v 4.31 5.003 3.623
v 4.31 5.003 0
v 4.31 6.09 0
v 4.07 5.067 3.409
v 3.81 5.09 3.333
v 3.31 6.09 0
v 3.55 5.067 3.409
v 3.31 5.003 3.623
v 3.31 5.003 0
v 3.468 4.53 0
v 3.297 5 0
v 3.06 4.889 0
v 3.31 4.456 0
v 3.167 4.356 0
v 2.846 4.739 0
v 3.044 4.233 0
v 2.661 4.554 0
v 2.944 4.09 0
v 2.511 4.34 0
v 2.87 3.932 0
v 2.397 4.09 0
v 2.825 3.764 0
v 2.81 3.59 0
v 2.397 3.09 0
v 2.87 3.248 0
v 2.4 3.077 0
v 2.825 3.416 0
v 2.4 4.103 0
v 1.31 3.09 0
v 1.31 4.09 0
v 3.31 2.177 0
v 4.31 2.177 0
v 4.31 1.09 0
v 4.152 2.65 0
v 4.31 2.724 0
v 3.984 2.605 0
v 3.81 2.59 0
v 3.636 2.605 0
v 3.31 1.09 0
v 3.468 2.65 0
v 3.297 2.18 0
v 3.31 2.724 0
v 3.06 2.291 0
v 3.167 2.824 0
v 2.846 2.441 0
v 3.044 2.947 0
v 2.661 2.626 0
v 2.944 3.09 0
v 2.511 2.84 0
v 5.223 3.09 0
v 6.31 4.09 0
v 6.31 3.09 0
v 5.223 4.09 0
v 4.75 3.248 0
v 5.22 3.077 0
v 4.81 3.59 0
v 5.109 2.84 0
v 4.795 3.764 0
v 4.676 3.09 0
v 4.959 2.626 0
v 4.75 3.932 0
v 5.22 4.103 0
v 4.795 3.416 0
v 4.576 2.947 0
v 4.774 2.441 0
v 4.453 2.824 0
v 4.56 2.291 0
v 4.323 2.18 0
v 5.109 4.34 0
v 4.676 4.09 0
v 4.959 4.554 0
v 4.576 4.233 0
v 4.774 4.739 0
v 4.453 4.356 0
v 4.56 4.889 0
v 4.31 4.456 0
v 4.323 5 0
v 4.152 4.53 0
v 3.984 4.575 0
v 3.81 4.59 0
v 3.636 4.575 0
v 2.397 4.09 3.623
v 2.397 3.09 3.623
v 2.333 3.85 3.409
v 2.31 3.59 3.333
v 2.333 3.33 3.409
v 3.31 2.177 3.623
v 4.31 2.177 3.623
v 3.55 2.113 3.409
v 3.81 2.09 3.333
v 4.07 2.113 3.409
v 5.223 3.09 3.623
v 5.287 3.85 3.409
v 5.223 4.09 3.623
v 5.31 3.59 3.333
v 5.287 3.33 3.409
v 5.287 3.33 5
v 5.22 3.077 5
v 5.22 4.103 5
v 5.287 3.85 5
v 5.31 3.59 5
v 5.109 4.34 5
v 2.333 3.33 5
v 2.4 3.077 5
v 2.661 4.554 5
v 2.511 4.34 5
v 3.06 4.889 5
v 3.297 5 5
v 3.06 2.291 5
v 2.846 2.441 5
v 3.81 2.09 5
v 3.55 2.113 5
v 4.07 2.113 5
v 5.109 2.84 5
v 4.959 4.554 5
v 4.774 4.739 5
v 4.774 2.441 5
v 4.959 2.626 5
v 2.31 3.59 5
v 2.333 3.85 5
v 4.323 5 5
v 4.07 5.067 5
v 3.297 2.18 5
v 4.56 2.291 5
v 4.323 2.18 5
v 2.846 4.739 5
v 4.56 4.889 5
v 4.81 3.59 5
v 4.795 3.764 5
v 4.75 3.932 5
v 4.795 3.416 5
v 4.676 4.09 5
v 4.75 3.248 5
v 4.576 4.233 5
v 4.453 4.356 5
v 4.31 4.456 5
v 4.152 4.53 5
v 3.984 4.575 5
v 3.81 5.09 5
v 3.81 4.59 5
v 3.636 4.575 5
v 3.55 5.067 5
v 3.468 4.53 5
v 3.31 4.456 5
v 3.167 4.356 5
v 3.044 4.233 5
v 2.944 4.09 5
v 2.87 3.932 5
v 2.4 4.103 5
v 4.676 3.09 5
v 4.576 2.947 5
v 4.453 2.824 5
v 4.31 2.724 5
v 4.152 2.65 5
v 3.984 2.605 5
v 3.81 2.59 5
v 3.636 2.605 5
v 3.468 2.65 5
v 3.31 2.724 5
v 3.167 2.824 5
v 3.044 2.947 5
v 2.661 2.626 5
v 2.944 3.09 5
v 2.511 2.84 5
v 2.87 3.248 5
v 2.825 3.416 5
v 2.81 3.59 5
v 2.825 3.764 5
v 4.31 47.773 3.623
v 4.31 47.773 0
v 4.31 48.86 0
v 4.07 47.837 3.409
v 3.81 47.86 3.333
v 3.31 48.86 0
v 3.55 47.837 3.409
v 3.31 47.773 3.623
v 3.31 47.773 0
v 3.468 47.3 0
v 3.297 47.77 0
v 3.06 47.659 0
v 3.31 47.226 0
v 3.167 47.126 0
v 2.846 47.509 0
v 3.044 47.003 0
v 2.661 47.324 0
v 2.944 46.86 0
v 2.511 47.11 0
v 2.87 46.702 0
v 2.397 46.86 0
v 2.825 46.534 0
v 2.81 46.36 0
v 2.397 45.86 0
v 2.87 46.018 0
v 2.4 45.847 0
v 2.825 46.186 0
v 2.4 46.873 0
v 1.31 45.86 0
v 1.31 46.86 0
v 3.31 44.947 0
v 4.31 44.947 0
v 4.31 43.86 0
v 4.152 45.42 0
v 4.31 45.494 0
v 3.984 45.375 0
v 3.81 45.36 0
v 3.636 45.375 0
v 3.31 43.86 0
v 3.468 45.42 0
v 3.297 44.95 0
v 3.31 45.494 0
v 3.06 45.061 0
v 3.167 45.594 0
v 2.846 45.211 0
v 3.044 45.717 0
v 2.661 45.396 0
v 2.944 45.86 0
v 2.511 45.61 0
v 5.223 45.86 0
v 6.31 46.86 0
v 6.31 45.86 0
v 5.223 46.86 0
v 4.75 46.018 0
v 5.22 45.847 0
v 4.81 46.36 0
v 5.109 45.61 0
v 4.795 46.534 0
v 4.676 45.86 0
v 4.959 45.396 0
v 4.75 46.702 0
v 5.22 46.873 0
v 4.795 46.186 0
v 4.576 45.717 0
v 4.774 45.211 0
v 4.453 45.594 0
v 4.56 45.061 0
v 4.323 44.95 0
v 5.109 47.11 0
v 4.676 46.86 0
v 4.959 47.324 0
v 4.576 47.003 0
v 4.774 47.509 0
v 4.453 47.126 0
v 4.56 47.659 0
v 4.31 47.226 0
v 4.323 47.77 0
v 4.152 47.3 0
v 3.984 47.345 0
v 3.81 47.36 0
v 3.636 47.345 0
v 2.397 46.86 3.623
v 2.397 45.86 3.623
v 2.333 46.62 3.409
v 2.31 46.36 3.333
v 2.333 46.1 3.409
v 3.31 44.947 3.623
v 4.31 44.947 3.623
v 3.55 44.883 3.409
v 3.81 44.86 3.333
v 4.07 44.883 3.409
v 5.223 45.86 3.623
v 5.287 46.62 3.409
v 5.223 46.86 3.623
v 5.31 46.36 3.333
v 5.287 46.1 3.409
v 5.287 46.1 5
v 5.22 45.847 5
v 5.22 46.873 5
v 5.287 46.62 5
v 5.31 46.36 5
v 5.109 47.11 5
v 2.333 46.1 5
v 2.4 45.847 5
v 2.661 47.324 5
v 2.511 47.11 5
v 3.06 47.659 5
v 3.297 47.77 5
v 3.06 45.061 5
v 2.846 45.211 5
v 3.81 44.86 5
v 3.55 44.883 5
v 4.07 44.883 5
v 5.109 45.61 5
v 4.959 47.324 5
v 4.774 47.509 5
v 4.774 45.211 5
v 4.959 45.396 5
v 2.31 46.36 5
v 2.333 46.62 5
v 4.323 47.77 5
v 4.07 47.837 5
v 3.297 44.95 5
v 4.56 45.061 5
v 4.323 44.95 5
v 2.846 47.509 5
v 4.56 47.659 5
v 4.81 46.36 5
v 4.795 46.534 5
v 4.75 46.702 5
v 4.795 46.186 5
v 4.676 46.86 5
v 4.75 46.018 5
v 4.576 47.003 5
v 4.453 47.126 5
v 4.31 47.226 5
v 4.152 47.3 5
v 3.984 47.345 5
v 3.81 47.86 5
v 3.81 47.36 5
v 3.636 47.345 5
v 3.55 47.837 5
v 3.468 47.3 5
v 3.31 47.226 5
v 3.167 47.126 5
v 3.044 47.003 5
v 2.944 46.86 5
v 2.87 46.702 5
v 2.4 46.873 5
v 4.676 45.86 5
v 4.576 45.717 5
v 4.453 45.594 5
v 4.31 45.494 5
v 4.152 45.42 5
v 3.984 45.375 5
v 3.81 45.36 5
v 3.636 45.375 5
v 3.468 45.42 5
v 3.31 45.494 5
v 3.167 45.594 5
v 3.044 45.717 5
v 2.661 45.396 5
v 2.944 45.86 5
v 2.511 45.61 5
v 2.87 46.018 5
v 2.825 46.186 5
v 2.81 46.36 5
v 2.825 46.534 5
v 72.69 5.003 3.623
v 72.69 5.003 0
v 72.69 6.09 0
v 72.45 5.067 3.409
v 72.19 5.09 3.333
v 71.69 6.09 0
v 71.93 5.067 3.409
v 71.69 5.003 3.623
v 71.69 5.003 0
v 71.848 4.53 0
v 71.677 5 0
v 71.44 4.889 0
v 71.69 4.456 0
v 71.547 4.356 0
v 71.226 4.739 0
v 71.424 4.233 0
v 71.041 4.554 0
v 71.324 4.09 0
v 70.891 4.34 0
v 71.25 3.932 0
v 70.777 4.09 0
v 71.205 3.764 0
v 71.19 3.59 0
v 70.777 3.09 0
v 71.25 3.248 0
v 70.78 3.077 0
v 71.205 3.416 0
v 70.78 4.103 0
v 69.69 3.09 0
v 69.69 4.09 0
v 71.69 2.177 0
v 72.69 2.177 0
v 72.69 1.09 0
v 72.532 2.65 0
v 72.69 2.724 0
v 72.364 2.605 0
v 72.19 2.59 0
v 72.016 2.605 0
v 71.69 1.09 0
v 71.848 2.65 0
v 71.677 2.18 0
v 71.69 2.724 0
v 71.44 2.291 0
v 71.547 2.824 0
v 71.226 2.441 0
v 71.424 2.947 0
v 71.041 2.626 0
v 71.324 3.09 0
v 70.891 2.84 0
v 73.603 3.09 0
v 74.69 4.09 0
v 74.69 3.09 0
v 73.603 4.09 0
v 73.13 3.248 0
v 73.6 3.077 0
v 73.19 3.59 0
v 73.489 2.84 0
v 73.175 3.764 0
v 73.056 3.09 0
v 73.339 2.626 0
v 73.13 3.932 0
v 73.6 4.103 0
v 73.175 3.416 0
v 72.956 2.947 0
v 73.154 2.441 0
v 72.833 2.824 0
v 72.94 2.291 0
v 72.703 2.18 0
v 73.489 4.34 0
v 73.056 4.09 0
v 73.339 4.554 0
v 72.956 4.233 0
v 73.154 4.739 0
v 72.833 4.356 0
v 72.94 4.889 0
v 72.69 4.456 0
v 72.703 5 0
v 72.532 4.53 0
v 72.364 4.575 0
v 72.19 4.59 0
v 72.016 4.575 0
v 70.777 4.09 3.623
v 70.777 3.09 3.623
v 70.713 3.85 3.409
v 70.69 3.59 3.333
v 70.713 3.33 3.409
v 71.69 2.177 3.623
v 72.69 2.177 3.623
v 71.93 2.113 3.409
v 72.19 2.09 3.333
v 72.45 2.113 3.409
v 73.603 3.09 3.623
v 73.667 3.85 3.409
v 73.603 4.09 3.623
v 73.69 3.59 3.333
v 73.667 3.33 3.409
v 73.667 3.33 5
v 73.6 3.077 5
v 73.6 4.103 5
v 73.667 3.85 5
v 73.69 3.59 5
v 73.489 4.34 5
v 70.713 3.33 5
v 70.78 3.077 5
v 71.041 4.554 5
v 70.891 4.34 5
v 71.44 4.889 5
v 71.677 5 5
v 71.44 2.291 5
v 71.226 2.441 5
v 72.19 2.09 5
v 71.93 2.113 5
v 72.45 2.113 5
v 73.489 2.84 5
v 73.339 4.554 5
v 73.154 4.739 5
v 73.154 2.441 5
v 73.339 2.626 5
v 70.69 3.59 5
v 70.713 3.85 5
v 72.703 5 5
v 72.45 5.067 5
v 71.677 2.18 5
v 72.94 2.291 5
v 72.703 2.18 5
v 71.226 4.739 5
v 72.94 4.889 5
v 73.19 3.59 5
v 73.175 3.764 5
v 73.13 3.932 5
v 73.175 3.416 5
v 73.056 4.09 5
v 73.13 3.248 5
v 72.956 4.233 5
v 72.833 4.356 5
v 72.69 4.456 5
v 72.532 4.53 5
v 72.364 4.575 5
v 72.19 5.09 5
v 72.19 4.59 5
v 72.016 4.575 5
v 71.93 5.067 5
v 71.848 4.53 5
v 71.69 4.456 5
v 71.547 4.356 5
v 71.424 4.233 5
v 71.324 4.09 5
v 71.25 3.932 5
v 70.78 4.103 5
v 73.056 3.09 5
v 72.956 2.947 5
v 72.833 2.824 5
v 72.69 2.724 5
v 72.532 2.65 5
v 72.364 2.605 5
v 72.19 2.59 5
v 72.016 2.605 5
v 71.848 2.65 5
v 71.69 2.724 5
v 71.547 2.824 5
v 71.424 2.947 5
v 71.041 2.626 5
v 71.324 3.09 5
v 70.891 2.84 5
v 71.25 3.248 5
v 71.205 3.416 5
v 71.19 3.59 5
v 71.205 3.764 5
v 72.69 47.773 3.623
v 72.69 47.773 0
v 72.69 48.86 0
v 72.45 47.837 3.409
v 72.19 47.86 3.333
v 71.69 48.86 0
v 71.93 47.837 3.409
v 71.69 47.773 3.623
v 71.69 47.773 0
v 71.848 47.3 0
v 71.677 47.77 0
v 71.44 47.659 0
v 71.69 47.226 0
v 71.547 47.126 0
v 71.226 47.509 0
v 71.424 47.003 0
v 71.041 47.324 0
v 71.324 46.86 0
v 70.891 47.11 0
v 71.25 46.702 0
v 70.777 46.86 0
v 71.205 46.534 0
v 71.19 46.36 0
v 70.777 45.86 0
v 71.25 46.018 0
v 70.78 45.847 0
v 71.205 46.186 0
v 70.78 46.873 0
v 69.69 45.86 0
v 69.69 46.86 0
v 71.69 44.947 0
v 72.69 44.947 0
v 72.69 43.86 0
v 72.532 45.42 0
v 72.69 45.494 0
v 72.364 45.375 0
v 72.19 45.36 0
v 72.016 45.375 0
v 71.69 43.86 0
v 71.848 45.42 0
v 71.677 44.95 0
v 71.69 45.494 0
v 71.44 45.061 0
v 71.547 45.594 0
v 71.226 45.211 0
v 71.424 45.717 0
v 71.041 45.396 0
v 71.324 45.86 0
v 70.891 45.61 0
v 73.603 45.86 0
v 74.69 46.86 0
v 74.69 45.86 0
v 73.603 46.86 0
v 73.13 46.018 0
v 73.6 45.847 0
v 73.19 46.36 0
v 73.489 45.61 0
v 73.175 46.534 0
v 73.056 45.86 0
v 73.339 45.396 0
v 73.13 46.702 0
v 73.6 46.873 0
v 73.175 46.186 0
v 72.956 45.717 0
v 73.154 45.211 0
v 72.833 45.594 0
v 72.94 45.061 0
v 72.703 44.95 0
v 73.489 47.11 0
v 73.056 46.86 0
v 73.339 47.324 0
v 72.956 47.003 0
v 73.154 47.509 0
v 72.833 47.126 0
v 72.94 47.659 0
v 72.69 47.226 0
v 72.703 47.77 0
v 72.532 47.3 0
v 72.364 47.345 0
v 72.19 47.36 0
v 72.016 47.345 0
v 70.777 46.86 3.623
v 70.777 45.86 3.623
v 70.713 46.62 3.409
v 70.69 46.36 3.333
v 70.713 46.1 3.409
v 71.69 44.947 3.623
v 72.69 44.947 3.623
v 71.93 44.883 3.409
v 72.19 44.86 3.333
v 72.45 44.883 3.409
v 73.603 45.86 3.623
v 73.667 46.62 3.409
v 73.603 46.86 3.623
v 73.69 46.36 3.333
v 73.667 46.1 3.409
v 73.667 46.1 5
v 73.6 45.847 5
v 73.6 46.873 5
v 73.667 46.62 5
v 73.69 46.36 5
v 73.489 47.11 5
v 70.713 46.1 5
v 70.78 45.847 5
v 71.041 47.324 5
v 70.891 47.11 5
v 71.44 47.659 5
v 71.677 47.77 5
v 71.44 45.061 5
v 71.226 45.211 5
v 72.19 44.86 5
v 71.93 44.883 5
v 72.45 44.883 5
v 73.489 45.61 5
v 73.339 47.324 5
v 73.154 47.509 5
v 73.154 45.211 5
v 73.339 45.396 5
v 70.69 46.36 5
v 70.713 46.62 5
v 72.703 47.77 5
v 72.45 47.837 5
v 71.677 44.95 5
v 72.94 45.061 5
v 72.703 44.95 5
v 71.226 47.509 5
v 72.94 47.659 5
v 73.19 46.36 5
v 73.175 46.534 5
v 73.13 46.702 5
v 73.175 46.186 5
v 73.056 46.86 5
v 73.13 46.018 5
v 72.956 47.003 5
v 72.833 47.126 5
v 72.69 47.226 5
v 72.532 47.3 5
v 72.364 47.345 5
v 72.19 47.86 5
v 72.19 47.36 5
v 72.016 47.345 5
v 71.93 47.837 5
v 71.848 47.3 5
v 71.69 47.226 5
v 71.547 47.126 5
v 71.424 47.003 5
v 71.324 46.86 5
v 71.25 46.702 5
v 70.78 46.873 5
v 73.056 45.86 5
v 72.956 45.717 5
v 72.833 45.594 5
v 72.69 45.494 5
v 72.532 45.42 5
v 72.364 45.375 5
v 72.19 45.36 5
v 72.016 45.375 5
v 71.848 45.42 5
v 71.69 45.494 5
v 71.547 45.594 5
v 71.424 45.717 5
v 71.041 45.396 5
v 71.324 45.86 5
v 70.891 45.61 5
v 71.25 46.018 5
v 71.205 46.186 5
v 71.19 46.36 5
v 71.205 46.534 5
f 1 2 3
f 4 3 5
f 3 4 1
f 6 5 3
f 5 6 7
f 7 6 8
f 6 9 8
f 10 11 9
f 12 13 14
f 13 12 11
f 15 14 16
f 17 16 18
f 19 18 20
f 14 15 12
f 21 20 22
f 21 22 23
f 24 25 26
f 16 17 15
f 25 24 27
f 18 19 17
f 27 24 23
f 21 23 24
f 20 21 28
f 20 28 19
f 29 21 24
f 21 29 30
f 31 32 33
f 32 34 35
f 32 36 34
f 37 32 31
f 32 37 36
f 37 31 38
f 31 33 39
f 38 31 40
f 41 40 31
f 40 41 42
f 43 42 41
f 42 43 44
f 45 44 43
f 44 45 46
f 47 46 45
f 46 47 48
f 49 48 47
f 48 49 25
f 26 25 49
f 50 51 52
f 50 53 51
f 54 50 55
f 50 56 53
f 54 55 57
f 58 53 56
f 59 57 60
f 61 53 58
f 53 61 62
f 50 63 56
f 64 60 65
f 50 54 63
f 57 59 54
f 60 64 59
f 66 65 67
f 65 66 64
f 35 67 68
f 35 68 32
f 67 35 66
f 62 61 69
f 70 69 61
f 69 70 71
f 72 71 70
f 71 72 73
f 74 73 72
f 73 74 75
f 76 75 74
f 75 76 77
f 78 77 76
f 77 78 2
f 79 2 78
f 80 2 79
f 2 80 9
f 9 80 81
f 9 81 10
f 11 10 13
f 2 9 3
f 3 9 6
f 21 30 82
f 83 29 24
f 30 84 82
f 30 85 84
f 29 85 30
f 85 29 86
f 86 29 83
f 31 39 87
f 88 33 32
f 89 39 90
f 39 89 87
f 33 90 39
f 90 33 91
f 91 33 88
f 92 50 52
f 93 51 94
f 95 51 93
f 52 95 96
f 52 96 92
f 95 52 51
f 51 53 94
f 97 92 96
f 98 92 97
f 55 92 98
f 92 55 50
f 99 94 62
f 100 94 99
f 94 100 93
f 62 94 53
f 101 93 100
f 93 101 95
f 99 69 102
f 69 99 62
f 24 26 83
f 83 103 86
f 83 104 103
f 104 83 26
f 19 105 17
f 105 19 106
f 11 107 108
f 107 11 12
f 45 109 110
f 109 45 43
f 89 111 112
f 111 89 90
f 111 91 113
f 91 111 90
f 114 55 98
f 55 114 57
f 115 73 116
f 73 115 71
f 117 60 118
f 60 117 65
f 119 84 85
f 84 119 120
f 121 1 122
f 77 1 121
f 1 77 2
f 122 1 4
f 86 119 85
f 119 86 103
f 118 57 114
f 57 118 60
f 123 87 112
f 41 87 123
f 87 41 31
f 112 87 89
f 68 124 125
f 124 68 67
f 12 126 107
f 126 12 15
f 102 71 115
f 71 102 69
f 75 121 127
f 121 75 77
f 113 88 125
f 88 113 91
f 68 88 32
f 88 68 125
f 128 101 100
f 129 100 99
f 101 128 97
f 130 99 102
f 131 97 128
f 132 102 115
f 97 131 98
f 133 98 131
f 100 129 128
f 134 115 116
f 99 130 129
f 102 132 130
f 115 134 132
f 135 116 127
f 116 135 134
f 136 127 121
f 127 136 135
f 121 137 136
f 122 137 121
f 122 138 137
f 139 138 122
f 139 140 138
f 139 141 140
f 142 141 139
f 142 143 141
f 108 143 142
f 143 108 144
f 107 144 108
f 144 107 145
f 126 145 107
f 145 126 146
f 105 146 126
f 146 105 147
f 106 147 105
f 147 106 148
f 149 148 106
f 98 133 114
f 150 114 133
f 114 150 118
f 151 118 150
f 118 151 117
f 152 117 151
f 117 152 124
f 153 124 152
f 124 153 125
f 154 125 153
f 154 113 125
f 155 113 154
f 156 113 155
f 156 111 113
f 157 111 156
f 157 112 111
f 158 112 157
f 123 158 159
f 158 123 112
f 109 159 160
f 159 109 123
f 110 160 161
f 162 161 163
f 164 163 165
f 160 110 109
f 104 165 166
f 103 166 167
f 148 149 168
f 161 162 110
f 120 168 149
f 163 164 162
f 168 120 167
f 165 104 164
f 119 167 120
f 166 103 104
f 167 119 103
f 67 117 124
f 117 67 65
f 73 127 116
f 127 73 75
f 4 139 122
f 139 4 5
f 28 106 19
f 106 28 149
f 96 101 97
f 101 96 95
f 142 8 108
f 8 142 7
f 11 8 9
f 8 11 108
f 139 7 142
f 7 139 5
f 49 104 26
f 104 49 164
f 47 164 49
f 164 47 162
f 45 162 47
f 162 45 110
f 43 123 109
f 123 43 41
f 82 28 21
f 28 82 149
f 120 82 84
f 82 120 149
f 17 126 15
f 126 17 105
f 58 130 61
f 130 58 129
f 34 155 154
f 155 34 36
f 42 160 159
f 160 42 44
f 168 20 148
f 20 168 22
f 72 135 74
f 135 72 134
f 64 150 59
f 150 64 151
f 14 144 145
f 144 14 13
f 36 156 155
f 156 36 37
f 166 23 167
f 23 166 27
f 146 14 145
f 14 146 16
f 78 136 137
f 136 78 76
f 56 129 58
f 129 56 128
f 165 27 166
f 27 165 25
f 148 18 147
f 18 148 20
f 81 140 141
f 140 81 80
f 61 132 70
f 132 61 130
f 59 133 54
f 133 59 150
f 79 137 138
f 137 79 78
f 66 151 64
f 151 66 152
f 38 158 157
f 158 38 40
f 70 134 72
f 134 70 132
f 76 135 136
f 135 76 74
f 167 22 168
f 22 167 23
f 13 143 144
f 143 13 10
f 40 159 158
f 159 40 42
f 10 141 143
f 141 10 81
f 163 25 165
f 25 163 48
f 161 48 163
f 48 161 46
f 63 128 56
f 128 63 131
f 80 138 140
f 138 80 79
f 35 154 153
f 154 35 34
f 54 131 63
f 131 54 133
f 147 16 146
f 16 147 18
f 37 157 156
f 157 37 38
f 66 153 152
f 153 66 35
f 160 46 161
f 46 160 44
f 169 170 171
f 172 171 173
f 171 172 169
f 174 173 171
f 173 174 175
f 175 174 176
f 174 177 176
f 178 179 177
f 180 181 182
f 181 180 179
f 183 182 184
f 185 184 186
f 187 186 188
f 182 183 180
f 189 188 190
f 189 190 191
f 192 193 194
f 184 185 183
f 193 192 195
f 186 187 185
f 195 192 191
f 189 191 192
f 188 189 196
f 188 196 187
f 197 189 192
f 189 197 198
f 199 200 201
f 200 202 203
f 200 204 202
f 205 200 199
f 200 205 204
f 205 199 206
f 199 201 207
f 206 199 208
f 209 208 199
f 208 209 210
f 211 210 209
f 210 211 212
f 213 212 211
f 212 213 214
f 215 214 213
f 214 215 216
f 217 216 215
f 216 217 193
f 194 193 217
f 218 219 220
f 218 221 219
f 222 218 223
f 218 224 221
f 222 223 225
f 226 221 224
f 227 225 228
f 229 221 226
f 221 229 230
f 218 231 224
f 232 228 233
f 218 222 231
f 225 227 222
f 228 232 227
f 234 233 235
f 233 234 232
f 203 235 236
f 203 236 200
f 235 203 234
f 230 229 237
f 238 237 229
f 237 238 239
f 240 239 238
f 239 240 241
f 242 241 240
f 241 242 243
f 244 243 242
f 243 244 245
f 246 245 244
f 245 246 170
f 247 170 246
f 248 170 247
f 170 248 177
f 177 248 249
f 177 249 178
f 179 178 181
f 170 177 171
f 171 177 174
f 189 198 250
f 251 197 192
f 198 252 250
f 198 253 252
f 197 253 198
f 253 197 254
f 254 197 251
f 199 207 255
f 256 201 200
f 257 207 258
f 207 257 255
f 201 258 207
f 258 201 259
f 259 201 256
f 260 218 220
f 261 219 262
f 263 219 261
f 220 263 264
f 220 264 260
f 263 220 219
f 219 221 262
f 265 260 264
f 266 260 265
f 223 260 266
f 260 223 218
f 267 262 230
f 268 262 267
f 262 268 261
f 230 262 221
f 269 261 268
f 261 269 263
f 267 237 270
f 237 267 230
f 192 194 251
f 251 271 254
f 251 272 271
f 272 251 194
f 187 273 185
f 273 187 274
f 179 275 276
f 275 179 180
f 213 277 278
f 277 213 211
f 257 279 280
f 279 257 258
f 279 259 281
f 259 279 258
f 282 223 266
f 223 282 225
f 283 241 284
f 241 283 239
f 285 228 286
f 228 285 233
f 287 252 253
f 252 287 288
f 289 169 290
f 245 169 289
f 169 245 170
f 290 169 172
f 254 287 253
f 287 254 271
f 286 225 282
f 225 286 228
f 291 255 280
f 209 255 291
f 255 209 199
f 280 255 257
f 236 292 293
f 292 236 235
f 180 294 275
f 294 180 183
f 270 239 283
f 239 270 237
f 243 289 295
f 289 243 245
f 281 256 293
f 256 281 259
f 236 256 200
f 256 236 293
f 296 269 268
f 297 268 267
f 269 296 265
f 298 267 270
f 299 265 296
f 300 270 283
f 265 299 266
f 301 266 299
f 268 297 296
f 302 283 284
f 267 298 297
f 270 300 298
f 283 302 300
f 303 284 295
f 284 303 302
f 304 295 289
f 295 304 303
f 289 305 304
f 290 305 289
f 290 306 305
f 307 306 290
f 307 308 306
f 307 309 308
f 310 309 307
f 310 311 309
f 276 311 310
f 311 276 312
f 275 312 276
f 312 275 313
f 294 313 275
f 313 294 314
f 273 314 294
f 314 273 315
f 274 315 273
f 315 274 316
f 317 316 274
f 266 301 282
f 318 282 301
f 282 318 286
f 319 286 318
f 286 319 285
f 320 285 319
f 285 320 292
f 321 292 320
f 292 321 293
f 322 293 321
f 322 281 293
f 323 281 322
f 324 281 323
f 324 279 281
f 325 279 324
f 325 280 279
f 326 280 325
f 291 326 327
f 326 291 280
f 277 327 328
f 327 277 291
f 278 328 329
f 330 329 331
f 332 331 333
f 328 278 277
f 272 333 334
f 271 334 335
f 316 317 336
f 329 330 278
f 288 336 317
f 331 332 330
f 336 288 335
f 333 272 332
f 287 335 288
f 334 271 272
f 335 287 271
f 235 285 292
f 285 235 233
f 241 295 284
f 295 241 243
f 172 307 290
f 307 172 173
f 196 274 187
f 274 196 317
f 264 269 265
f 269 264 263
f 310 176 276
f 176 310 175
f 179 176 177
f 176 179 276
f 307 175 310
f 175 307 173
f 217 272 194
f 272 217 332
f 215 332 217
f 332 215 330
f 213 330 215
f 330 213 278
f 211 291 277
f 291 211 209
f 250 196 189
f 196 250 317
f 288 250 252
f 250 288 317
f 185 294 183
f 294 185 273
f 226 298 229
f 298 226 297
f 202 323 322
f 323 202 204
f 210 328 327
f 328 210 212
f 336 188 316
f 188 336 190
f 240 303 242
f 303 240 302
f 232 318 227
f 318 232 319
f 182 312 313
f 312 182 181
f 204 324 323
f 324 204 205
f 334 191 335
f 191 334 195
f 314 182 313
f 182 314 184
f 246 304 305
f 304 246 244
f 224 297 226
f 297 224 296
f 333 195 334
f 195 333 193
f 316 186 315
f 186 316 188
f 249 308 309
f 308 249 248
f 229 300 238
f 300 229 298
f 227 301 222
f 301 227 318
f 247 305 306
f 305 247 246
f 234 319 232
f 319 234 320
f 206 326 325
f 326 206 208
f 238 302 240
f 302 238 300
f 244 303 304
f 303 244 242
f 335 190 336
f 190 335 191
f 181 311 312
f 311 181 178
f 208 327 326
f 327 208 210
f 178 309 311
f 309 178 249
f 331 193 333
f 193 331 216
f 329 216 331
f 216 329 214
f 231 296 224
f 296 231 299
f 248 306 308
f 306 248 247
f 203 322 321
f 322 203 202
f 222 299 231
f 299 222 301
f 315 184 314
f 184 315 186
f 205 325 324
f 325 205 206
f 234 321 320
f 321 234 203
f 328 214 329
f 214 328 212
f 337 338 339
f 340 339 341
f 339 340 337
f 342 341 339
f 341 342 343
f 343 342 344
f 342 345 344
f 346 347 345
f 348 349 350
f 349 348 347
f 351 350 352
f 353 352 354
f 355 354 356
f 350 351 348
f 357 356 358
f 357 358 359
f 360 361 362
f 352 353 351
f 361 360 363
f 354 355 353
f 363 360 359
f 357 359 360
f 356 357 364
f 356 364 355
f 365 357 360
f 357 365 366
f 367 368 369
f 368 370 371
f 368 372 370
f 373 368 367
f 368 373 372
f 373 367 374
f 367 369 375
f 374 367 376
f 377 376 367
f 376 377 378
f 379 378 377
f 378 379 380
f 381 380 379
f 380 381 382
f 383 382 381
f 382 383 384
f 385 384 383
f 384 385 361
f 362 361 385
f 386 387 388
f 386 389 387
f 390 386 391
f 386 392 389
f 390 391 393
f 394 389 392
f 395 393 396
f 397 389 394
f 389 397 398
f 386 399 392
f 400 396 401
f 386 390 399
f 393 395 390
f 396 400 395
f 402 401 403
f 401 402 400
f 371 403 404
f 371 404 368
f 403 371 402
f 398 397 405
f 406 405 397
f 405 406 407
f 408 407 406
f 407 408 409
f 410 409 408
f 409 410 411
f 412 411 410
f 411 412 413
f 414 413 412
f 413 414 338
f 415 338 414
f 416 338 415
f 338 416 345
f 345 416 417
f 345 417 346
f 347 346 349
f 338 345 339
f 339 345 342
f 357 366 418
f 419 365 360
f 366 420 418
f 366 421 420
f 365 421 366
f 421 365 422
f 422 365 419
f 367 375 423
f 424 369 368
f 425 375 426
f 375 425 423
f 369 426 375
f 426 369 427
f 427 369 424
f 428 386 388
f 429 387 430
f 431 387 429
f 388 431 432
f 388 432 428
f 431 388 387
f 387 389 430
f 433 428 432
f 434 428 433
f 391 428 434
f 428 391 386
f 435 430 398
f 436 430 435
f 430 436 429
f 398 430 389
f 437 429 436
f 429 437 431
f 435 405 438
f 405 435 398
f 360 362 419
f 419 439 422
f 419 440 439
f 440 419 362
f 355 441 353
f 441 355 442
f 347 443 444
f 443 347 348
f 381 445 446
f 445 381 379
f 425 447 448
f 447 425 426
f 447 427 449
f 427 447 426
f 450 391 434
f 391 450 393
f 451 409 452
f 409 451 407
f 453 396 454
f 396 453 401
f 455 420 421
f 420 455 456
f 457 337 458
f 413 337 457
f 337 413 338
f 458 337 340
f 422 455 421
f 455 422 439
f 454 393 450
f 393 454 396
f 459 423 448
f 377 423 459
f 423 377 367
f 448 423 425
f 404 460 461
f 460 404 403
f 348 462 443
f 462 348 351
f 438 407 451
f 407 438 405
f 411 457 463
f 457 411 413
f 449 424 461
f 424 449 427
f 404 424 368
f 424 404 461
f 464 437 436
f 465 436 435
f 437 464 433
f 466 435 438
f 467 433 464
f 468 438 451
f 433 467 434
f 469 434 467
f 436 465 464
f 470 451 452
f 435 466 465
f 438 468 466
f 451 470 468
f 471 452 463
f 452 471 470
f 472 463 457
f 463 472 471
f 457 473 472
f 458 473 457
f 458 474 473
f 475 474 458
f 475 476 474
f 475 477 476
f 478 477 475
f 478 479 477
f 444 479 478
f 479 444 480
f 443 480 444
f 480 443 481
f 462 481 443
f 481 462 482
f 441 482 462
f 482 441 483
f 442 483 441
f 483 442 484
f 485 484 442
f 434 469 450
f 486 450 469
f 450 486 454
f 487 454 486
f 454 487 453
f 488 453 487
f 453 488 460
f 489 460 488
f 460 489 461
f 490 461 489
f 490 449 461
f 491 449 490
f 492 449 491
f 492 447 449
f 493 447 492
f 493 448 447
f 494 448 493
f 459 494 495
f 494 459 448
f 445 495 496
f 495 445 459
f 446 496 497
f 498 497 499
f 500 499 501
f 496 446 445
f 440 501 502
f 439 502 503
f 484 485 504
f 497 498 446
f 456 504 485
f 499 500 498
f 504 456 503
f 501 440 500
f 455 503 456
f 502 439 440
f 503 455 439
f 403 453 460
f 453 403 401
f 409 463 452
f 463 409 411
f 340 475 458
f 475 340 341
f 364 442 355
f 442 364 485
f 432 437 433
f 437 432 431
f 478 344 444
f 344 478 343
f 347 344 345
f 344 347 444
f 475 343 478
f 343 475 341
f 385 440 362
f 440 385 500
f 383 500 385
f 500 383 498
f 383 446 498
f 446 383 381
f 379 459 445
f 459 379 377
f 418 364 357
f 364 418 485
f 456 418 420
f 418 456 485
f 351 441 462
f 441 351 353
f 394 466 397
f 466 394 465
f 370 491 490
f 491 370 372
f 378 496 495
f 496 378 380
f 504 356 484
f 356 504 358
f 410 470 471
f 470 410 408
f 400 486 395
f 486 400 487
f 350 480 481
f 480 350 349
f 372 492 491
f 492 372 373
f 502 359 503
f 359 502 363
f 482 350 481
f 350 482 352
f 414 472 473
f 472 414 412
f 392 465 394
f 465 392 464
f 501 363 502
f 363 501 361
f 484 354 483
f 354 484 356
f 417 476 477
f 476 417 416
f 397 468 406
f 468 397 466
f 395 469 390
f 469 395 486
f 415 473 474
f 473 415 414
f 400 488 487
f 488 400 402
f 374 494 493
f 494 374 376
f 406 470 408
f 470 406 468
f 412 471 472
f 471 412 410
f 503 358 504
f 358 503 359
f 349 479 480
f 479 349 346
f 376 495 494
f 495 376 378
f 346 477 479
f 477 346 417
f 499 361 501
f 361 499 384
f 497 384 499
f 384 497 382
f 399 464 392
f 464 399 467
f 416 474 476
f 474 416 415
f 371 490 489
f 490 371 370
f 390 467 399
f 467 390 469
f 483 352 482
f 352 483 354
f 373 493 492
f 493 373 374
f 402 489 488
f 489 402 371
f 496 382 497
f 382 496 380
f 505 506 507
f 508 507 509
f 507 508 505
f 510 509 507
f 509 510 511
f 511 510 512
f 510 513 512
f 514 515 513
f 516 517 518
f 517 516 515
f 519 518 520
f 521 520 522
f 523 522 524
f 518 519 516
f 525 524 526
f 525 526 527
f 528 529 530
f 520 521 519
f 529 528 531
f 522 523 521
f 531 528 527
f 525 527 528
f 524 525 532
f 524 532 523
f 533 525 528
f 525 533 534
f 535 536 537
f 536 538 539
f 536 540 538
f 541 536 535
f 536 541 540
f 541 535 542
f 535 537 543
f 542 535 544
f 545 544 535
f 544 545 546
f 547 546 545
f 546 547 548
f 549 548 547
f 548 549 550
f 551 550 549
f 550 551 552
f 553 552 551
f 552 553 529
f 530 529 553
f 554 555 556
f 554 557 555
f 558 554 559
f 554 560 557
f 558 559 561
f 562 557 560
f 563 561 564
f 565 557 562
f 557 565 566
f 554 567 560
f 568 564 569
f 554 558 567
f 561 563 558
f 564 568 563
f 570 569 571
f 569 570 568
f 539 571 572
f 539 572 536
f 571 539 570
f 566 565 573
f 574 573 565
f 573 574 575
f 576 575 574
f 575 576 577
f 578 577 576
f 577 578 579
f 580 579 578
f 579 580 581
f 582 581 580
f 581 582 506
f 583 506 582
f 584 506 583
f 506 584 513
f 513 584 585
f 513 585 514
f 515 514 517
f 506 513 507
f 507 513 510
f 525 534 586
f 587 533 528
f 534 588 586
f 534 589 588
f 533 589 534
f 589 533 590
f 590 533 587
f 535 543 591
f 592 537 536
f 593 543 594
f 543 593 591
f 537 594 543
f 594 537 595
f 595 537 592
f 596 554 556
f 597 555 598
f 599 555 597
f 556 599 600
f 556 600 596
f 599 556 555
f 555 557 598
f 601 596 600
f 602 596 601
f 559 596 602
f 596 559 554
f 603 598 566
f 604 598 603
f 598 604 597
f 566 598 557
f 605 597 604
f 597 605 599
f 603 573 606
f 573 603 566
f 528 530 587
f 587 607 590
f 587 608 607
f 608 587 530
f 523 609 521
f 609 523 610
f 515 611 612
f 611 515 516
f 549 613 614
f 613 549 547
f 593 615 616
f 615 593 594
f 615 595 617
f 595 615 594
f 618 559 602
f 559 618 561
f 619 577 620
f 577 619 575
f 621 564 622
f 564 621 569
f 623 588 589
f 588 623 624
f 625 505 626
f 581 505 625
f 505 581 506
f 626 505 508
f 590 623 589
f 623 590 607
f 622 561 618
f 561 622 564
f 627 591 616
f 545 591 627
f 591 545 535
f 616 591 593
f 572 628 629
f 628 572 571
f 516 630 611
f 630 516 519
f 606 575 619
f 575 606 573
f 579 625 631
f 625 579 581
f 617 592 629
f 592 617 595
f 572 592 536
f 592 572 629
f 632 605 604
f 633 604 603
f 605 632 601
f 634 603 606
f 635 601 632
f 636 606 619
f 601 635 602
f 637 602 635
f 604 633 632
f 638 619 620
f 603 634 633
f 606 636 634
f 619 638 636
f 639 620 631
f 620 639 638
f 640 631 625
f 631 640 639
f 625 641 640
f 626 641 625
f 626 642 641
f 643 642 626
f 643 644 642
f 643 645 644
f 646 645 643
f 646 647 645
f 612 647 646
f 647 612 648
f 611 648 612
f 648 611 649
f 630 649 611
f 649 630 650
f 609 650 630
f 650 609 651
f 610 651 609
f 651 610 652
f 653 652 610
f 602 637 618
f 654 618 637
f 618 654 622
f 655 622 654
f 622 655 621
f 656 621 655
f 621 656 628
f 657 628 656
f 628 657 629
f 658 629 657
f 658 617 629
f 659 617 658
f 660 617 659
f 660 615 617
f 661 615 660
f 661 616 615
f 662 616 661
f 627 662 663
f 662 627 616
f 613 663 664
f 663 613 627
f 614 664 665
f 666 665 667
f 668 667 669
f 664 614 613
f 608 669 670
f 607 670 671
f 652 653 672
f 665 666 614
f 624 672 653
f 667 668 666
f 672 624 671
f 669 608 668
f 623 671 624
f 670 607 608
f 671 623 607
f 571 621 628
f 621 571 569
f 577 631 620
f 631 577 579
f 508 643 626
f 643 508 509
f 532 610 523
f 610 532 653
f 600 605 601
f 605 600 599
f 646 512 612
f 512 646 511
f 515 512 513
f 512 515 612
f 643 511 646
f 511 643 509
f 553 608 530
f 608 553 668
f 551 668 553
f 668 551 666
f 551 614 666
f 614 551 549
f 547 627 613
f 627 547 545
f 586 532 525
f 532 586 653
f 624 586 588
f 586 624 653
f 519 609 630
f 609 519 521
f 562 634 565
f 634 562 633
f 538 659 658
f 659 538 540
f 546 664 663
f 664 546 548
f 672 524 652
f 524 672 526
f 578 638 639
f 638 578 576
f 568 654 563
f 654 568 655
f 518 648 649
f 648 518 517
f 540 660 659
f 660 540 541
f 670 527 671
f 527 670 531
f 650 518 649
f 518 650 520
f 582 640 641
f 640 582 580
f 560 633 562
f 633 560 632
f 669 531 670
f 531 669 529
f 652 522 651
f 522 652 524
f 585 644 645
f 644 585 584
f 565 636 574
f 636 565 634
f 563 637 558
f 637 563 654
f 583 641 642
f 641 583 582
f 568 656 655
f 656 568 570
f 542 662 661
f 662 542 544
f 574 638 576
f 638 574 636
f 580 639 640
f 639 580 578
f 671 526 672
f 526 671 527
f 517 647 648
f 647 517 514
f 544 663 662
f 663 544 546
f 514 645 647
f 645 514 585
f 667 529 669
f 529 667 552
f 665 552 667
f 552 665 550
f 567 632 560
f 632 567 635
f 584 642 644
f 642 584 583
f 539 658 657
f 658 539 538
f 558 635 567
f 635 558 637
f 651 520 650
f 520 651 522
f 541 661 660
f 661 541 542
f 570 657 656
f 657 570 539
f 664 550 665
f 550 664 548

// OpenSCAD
// file: posts.scad
/* Developed by Alex Grutter */

$fn = 36;

four_posts_with_supports(10, 3, 2, 25, 50, 5, 1, [0,0,0,0], 1, true);

module four_posts(post_height, post_outer_diameter, post_inner_diameter, post_spacing_width, post_spacing_length){
    difference()
    {
		/* Outer part */
		union()
		{
            translate([0, 0, 0])
            {
                cylinder(h = post_height, d = post_outer_diameter);
            }
            translate([0, post_spacing_length + 0, 0])
            {
                cylinder(h = post_height, d = post_outer_diameter);
            }
            translate([post_spacing_width + 0, 0, 0])
            {
                cylinder(h = post_height, d = post_outer_diameter);
            }
            translate([post_spacing_width + 0, post_spacing_length + 0, 0])
            {
                cylinder(h = post_height, d = post_outer_diameter);
            }
		}
		/* Inner hole */
        union()
        {
            translate([0, 0, -1])
            {
                cylinder(h = post_height+2, d = post_inner_diameter);
            }
            translate([0, post_spacing_length + 0, -1])
            {
                cylinder(h = post_height+2, d = post_inner_diameter);
            }
            translate([post_spacing_width + 0, 0, -1])
            {
                cylinder(h = post_height+2, d = post_inner_diameter);
            }
            translate([post_spacing_width + 0, post_spacing_length + 0, -1])
            {
                cylinder(h = post_height+2, d = post_inner_diameter);
            }
        }
	}
};

module four_posts_with_supports(post_height, post_outer_diameter, post_inner_diameter, post_spacing_width, post_spacing_length, support_diameter, support_count, support_start_angle, support_thickness, flip){
    difference()
    {
		/* Outer part */
		union()
		{
            translate([0, 0, 0])
            {
                cylinder(h = post_height, d = post_outer_diameter);
				for(support = [0 : support_count])
				{
					if(flip)
					{
						translate([0, 0, post_height])
						rotate([support_start_angle[0] + ( support * (360 / support_count)),90,0])
						translate([0, 0, -(support_thickness / 2)])
						linear_extrude(support_thickness)
						polygon([[post_height, (post_inner_diameter / 2)],[0, (post_inner_diameter / 2)],[0,(support_diameter / 2)]], [[0,1,2]]);
					}
					else
					{
						rotate([support_start_angle[0] + ( support * (360 / support_count)),-90,0])
						translate([0, 0, -(support_thickness / 2)])
						linear_extrude(support_thickness)
						polygon([[post_height, (post_inner_diameter / 2)],[0, (post_inner_diameter / 2)],[0, (support_diameter / 2)]], [[0,1,2]]);
					}
				}
            }
            translate([0, post_spacing_length + 0, 0])
            {
                cylinder(h = post_height, d = post_outer_diameter);
				for(support = [0 : support_count])
				{
					if(flip)
					{
						translate([0, 0, post_height])
						rotate([support_start_angle[1] + ( support * (360 / support_count)),90,0])
						translate([0, 0, -(support_thickness / 2)])
						linear_extrude(support_thickness)
						polygon([[post_height, (post_inner_diameter / 2)],[0, (post_inner_diameter / 2)],[0,(support_diameter / 2)]], [[0,1,2]]);
					}
					else
					{
						rotate([support_start_angle[1] + ( support * (360 / support_count)),-90,0])
						translate([0, 0, -(support_thickness / 2)])
						linear_extrude(support_thickness)
						polygon([[post_height, (post_inner_diameter / 2)],[0, (post_inner_diameter / 2)],[0,(support_diameter / 2)]], [[0,1,2]]);
					}
				}
            }
            translate([post_spacing_width + 0, 0, 0])
            {
                cylinder(h = post_height, d = post_outer_diameter);
				for(support = [0 : support_count])
				{
					if(flip)
					{
						translate([0, 0, post_height])
						rotate([support_start_angle[2] + ( support * (360 / support_count)),90,0])
						translate([0, 0, -(support_thickness / 2)])
						linear_extrude(support_thickness)
						polygon([[post_height, (post_inner_diameter / 2)],[0, (post_inner_diameter / 2)],[0,(support_diameter / 2)]], [[0,1,2]]);
					}
					else
					{
						rotate([support_start_angle[2] + ( support * (360 / support_count)),-90,0])
						translate([0, 0, -(support_thickness / 2)])
						linear_extrude(support_thickness)
						polygon([[post_height, (post_inner_diameter / 2)],[0, (post_inner_diameter / 2)],[0,(support_diameter / 2)]], [[0,1,2]]);
					}
				}
            }
            translate([post_spacing_width + 0, post_spacing_length + 0, 0])
            {
                cylinder(h = post_height, d = post_outer_diameter);
				for(support = [0 : support_count])
				{
					if(flip)
					{
						translate([0, 0, post_height])
						rotate([support_start_angle[3] + ( support * (360 / support_count)),90,0])
						translate([0, 0, -(support_thickness / 2)])
						linear_extrude(support_thickness)
						polygon([[post_height, (post_inner_diameter / 2)],[0, (post_inner_diameter / 2)],[0,(support_diameter / 2)]], [[0,1,2]]);
					}
					else
					{
						rotate([support_start_angle[3] + ( support * (360 / support_count)),-90,0])
						translate([0, 0, -(support_thickness / 2)])
						linear_extrude(support_thickness)
						polygon([[post_height, (post_inner_diameter / 2)],[0, (post_inner_diameter / 2)],[0,(support_diameter / 2)]], [[0,1,2]]);
					}
				}
            }
		}
        
		/* Inner hole */
        union()
        {
            translate([0, 0, -1])
            {
                cylinder(h = post_height+2, d = post_inner_diameter);
            }
            translate([0, post_spacing_length + 0, -1])
            {
                cylinder(h = post_height+2, d = post_inner_diameter);
            }
            translate([post_spacing_width + 0, 0, -1])
            {
                cylinder(h = post_height+2, d = post_inner_diameter);
            }
            translate([post_spacing_width + 0, post_spacing_length + 0, -1])
            {
                cylinder(h = post_height+2, d = post_inner_diameter);
            }
        }
	}
};
// main file
use <posts.scad>

/* Examples for viewing */
renesas_synergy_ae_cloud1_posts();

module renesas_synergy_ae_cloud1_posts()
{
    /* Post parameters */
    post_height                 = 5;
    post_outer_diameter         = 3;
    post_inner_diameter         = 2;
    
    /* Post support parameters */
    support_diameter            = 5;
    support_count               = 4;
    support_start_angle         = [0,0,0,0];
    support_thickness           = 1;
    support_flip                = false;
    
    /* Length positioning parameters */
    hole1_offset_length         = 3.81;
    hole2_offset_length         = hole1_offset_length;
    hole3_offset_length         = 76.00 - 3.81;
    hole4_offset_length         = hole3_offset_length;
    
    /* Width positioning parameters */
    hole1_offset_width          = 49.95 - 3.59;
    hole2_offset_width          = 3.59;
    hole3_offset_width          = hole1_offset_width;
    hole4_offset_width          = hole2_offset_width;
    
    board_width                 = 49.95;

    /* Hole 1: */
    translate([hole1_offset_length, board_width - hole1_offset_width, 0])
    four_posts_with_supports(post_height, post_outer_diameter, post_inner_diameter, 0, 0, support_diameter, support_count, support_start_angle, support_thickness, support_flip);
    
    /* Hole 2: */
    translate([hole2_offset_length, board_width - hole2_offset_width, 0])
    four_posts_with_supports(post_height, post_outer_diameter, post_inner_diameter, 0, 0, support_diameter, support_count, support_start_angle, support_thickness, support_flip);
        
    /* Hole 3: */
    translate([hole3_offset_length, board_width - hole3_offset_width, 0])
    four_posts_with_supports(post_height, post_outer_diameter, post_inner_diameter, 0, 0, support_diameter, support_count, support_start_angle, support_thickness, support_flip);
    
    /* Hole 4: */
    translate([hole4_offset_length, board_width - hole4_offset_width, 0])
    four_posts_with_supports(post_height, post_outer_diameter, post_inner_diameter, 0, 0, support_diameter, support_count, support_start_angle, support_thickness, support_flip);
}
